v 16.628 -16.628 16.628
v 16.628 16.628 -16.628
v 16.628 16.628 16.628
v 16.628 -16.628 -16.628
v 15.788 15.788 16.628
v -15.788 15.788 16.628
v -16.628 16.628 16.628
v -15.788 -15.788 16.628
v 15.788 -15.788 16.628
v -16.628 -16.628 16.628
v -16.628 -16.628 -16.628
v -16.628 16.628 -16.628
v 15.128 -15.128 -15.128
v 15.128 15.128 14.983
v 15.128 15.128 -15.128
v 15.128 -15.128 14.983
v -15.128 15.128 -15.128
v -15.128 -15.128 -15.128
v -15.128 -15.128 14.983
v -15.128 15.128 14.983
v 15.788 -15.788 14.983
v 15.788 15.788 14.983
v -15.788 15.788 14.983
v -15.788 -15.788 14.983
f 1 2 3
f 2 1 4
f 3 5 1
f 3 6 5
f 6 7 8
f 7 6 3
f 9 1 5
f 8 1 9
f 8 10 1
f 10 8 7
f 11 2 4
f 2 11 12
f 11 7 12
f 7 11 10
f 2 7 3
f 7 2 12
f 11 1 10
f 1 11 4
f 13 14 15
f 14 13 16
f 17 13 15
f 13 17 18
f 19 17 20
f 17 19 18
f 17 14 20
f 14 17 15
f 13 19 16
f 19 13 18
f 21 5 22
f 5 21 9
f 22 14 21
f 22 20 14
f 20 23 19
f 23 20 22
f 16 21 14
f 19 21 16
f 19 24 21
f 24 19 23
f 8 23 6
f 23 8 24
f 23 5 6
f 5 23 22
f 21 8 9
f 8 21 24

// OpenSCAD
// Cube Jeu Sphère 50mm

// changelog
// v5
// - Bouchon droit
version = 5;

arete = 33.257;
epaisseurParoi = 1.5;
r = 0.29; // résolution d'impression sur l'axe Z

// distance entre la paroi extérieure et la découpe
// minimum semble etre >nozzle_diameter pour Zortrax M200
offset_decoupe_bouchon = 0.84;
bouchonOffset = 0.3;

// Permet meilleur encastrement du bouchon pour ne pas qu'il
// dépasse après collage
decoupeZOffset = -r/2;

//decoupe_bouchon();
corps_ouvert();
// bouchon();
//trou();

module corps_ouvert() {
	difference() {
		cube_creux();
		#decoupe_bouchon(offset_decoupe_bouchon, decoupeZOffset);
	}
}

module bouchon() {
	difference () {
        intersection() {
            cube_creux();
            decoupe_bouchon(offset_decoupe_bouchon+bouchonOffset);
        }
	}
}

module cube_creux() {
	difference() {
        cube(arete, center=true);
        cube(arete-2*epaisseurParoi, center=true);
	}
}

module decoupe_bouchon(d, zOffset = 0) {
    a = arete - 2*d;
	translate([0,0,arete/2+((epaisseurParoi+1)/2)-epaisseurParoi+zOffset])
		cube([a, a, epaisseurParoi+1], center=true);
}
